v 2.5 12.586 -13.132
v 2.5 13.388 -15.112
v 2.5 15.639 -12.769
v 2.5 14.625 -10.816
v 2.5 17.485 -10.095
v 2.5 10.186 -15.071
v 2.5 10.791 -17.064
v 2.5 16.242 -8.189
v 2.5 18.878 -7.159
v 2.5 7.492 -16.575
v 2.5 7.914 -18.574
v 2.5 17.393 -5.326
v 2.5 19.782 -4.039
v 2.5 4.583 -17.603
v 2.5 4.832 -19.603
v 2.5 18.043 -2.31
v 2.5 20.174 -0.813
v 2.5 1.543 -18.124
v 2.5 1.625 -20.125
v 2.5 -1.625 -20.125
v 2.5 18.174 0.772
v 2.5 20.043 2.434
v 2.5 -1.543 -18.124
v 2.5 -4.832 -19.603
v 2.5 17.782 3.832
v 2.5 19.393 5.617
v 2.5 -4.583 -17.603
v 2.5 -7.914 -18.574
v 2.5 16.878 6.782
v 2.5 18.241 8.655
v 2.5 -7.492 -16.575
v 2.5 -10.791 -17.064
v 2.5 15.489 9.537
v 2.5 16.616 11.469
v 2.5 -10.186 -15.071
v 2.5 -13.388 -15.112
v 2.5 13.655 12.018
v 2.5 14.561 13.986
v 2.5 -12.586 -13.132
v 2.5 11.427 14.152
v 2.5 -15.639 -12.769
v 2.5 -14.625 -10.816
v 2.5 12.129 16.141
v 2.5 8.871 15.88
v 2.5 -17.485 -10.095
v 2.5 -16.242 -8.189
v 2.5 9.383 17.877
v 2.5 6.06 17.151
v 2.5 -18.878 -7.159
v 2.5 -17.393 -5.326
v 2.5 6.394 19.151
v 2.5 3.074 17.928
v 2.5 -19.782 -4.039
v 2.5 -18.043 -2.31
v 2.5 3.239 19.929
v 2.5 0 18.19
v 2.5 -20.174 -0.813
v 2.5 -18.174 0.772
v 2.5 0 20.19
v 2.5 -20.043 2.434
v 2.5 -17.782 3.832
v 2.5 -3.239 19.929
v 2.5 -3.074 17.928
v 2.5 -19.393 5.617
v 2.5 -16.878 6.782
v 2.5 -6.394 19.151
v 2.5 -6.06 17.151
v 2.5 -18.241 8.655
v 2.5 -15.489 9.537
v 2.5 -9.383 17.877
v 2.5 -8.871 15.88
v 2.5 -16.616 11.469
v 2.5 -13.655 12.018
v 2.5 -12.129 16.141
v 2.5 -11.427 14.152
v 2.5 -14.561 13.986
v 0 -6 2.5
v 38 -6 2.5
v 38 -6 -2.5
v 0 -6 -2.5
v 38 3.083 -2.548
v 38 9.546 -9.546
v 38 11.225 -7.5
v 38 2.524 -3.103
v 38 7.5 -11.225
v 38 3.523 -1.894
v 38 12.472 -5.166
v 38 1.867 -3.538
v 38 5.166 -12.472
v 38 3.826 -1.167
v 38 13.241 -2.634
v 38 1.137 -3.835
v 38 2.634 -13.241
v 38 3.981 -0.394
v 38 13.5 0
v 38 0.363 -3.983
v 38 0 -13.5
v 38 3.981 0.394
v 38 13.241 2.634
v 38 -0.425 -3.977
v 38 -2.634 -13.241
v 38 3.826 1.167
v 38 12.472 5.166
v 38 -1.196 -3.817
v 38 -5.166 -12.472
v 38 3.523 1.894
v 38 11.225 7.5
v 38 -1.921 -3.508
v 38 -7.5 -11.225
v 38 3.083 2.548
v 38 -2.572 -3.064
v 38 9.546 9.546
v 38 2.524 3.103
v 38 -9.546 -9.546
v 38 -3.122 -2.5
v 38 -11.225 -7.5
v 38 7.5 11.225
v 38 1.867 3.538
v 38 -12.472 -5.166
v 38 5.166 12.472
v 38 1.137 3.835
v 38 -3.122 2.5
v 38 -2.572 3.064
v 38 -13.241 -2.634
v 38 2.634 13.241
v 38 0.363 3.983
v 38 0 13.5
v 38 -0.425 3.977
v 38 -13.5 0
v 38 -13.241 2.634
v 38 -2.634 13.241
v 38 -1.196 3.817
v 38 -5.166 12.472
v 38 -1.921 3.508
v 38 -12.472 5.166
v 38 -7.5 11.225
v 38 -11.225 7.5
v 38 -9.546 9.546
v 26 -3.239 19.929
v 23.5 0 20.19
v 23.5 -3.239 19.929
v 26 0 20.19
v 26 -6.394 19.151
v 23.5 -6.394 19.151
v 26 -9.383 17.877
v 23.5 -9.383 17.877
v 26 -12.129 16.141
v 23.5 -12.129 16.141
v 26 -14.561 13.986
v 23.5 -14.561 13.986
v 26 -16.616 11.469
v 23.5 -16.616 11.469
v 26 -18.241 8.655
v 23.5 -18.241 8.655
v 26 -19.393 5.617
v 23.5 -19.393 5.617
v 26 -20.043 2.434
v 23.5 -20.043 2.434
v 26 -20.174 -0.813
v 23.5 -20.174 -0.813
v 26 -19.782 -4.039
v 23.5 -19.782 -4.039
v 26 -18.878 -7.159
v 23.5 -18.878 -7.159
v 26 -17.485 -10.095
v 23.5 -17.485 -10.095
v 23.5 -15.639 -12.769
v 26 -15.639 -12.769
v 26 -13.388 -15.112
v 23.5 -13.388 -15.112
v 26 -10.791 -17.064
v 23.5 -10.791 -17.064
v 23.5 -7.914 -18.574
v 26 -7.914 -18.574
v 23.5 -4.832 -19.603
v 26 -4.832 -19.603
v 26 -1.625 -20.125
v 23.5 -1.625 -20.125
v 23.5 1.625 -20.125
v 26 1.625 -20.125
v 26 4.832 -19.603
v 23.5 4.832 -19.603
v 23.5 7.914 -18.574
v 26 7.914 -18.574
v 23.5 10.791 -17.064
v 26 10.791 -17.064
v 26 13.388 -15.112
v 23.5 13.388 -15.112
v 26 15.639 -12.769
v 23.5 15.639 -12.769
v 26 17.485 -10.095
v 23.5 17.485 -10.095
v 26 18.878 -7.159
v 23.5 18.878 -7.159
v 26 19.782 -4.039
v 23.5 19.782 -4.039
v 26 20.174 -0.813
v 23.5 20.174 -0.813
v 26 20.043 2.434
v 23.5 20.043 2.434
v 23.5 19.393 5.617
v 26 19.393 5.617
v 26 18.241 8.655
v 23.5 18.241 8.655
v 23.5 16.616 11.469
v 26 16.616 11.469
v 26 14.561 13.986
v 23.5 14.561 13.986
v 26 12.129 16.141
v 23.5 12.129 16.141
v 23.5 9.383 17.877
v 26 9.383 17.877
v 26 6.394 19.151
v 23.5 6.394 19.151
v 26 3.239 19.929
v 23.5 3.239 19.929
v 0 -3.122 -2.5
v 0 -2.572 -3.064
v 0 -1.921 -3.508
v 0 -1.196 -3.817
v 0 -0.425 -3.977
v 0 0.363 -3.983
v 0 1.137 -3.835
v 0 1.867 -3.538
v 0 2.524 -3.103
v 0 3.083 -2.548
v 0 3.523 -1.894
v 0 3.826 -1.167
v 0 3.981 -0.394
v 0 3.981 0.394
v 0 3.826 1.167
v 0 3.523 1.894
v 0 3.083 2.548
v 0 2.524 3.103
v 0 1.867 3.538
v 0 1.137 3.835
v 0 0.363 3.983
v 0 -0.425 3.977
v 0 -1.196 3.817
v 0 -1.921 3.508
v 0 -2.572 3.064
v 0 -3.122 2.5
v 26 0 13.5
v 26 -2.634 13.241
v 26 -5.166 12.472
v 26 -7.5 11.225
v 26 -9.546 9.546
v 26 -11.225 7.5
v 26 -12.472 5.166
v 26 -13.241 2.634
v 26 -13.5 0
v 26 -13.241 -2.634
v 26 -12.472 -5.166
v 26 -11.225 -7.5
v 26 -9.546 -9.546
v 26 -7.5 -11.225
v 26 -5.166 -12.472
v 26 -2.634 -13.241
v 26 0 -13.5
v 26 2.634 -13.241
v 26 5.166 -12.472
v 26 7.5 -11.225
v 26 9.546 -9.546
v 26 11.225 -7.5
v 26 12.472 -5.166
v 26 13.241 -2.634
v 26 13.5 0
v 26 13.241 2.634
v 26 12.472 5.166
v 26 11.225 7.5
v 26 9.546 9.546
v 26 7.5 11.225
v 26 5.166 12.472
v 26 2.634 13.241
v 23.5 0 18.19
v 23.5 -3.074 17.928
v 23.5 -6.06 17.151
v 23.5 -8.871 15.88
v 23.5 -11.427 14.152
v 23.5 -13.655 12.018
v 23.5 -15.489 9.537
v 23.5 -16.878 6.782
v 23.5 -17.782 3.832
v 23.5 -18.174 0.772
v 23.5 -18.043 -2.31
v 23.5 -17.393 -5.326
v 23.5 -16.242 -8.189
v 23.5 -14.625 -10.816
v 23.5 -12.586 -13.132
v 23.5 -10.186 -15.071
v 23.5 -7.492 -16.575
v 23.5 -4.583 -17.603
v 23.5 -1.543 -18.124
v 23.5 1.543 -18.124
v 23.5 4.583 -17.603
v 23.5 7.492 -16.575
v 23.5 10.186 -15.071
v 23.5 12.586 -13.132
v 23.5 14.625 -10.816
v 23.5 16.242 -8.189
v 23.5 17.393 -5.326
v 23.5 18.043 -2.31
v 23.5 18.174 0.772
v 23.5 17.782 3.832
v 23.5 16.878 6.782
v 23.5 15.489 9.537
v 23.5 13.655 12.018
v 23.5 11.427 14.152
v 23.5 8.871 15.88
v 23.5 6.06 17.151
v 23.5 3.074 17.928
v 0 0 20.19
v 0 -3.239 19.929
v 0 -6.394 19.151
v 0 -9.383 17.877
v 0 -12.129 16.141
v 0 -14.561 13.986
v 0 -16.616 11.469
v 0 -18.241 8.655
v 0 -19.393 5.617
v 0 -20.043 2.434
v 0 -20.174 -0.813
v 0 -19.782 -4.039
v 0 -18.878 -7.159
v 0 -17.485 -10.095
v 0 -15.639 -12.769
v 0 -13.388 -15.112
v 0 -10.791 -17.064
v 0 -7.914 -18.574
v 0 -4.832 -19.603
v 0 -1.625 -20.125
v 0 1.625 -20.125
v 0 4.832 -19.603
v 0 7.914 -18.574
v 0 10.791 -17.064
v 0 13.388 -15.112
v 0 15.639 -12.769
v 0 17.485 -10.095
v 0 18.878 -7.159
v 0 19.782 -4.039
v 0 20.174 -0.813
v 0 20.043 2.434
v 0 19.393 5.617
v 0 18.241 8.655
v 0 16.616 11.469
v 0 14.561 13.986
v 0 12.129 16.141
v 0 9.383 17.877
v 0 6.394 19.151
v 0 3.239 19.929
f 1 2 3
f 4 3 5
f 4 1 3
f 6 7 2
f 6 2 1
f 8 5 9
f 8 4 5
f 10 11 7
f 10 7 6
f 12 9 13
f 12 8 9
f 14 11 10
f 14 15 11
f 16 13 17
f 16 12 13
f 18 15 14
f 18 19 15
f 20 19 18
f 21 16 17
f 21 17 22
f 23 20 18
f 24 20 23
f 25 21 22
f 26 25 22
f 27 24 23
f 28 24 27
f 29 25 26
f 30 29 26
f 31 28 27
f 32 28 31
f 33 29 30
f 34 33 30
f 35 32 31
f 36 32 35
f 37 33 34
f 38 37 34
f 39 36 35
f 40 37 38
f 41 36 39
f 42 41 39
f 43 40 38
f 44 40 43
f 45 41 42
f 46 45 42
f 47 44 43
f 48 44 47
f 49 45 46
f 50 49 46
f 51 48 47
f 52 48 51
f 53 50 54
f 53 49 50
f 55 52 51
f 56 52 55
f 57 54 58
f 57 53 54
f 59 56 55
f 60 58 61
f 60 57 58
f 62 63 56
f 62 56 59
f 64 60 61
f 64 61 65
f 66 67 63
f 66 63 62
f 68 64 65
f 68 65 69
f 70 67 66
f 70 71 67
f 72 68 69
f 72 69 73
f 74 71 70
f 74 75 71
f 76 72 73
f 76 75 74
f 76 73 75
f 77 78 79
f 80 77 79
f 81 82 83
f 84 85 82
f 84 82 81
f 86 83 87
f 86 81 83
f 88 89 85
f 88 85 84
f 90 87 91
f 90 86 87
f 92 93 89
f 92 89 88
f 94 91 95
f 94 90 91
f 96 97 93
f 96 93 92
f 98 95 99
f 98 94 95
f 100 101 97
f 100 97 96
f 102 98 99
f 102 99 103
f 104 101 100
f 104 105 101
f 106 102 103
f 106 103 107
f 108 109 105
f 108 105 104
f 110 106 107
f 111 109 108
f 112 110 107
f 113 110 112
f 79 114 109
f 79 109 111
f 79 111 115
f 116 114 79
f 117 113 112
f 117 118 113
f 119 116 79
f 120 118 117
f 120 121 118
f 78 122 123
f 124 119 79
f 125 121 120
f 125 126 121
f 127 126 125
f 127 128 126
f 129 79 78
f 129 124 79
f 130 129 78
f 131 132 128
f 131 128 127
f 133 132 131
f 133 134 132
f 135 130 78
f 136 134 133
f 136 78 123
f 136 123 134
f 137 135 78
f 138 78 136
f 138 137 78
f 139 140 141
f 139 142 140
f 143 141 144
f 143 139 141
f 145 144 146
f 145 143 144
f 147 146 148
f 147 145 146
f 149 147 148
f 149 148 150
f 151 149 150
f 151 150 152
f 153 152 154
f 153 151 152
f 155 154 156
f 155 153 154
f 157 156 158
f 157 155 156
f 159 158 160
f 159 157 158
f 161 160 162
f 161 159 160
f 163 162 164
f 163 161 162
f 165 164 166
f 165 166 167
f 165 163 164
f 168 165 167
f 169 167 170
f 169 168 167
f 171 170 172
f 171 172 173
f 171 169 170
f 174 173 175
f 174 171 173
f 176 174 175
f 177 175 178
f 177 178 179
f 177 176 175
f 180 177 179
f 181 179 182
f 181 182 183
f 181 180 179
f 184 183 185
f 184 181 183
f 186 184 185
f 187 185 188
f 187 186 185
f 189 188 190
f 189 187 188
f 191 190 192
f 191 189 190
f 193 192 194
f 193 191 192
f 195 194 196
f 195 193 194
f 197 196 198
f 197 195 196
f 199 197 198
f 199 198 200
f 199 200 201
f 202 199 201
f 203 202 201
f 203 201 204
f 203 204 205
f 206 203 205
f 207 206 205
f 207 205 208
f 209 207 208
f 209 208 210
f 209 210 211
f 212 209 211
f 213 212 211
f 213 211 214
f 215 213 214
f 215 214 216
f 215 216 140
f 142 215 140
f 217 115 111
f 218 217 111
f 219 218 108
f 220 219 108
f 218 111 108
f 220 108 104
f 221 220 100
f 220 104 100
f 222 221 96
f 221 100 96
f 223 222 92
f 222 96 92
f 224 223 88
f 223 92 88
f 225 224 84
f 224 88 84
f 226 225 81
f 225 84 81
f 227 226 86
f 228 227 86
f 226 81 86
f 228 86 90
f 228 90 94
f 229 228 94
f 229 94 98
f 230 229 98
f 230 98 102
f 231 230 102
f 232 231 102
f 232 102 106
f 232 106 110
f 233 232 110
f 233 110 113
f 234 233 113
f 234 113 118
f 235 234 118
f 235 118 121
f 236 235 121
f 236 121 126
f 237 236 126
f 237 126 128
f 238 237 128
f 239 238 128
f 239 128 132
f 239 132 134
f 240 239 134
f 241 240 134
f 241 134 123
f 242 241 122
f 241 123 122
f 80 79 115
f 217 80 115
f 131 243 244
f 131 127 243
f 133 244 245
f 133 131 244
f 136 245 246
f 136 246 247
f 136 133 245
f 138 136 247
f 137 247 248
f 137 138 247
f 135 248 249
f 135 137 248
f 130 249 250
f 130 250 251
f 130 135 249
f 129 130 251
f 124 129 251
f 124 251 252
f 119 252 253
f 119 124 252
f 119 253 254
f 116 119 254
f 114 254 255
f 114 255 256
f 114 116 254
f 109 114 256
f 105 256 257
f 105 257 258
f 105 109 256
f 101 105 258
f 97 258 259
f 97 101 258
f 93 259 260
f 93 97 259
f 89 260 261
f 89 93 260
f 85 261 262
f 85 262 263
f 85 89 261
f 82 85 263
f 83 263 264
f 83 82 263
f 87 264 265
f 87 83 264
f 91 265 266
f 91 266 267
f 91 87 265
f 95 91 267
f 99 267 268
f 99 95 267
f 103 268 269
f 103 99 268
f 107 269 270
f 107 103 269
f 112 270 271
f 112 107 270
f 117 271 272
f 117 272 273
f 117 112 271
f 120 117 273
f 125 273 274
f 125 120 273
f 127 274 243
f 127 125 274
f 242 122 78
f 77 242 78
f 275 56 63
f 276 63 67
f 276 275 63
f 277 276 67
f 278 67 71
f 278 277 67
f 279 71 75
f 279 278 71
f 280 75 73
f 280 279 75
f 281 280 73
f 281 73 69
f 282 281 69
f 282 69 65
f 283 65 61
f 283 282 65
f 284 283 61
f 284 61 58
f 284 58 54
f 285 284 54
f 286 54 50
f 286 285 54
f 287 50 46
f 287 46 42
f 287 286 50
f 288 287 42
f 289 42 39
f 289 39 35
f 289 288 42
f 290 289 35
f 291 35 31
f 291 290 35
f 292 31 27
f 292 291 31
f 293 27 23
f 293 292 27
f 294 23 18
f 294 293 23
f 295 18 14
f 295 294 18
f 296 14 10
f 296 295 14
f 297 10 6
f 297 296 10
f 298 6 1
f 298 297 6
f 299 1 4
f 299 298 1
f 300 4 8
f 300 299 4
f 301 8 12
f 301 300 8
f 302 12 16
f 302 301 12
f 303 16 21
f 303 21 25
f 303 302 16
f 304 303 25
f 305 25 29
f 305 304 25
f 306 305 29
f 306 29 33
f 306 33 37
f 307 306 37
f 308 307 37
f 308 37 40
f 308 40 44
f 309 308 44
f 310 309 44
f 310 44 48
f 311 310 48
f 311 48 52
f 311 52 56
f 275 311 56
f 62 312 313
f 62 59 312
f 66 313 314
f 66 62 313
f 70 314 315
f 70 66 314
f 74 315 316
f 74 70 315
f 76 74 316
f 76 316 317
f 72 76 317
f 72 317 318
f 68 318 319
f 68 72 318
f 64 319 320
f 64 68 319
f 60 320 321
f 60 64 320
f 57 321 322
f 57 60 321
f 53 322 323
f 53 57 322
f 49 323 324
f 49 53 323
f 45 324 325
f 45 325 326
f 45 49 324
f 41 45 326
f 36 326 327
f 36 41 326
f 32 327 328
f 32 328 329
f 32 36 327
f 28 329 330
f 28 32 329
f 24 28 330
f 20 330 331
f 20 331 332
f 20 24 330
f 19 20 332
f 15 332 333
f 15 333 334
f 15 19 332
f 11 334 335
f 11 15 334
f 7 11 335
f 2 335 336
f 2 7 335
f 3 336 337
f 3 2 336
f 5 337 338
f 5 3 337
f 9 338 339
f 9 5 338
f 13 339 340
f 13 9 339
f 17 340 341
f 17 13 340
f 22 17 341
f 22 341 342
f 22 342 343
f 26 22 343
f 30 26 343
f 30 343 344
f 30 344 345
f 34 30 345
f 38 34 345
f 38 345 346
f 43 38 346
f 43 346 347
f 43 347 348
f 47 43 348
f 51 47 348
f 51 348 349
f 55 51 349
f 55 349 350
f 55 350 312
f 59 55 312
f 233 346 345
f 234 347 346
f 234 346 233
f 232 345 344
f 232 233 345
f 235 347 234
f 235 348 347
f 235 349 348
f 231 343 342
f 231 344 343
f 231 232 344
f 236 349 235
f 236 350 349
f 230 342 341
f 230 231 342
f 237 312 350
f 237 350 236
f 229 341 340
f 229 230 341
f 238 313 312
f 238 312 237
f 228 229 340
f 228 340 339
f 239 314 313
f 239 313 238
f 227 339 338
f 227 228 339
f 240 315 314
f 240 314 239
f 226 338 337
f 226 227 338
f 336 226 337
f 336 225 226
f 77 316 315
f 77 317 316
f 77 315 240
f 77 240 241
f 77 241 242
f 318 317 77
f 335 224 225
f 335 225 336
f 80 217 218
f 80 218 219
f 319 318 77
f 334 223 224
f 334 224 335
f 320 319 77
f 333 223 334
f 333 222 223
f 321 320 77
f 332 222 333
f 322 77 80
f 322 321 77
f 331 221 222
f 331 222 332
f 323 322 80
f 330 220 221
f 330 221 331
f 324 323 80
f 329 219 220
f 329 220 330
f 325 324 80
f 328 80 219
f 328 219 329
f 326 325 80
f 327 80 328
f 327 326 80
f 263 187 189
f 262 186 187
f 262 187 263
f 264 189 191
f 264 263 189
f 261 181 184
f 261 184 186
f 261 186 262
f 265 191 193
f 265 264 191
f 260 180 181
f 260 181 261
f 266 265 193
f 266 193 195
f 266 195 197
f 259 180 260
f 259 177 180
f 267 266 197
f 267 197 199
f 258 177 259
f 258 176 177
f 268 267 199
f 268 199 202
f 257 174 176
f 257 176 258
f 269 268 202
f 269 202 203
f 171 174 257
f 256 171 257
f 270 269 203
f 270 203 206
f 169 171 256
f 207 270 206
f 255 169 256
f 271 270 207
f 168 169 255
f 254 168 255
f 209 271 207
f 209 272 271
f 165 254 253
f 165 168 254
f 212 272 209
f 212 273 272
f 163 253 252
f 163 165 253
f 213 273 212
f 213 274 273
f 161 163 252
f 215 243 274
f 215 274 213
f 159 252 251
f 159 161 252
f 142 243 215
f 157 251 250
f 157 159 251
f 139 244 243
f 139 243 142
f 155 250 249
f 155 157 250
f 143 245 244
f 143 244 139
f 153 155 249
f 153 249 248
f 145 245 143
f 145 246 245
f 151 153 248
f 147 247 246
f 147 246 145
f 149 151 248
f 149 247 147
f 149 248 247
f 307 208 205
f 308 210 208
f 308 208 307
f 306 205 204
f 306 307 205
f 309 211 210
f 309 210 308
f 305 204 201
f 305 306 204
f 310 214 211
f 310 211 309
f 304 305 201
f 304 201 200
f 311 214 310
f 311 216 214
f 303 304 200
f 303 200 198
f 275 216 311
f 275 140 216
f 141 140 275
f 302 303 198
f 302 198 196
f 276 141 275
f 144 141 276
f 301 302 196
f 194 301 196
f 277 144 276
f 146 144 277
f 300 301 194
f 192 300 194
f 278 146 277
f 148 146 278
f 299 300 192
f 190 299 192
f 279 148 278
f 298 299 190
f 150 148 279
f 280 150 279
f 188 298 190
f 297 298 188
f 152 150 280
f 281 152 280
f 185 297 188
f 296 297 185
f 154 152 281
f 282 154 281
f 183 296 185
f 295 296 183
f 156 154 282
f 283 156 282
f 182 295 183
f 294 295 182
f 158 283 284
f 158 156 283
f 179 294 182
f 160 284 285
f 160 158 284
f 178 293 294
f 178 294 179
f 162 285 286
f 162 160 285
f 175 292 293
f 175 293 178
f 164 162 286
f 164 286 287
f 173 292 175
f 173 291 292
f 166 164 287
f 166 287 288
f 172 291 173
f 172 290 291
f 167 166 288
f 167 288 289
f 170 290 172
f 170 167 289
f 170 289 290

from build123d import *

# Parameters (mm, degrees)
CUT_EXTRUDE_1_DEPTH = 48.531801986


with BuildPart() as part:
    # 草图1 → 旋转1 (revolve)
    with BuildSketch(Plane.XY, mode=Mode.PRIVATE) as revolve_1_sk:
        Polygon((0, 0), (0, 20.19), (2.5, 20.19), (2.5, 18.19), (23.5, 18.19), (23.5, 20.19), (26, 20.19), (26, 13.5), (38, 13.5), (38, 0), align=None)
    revolve(revolve_1_sk.sketch.rotate(Axis((0, 0, 0), (1, 0, 0)), 90), axis=Axis((0, 0, 0), (1, 0, 0)))

    # 草图2 → 切除-拉伸1 (cut, through all)
    with BuildSketch(Plane(origin=(38, 0, 0), x_dir=(0, 0, -1), z_dir=(1, 0, 0))):
        with BuildLine():
            Line((-2.5, -3.122498999), (-2.5, -6))
            Line((-2.5, -6), (2.5, -6))
            Line((2.5, -6), (2.5, -3.122498999))
            ThreePointArc((2.5, -3.122498999), (0, 4), (-2.5, -3.122498999))
        make_face()
    extrude(amount=-CUT_EXTRUDE_1_DEPTH, mode=Mode.SUBTRACT)


solid = part.part
